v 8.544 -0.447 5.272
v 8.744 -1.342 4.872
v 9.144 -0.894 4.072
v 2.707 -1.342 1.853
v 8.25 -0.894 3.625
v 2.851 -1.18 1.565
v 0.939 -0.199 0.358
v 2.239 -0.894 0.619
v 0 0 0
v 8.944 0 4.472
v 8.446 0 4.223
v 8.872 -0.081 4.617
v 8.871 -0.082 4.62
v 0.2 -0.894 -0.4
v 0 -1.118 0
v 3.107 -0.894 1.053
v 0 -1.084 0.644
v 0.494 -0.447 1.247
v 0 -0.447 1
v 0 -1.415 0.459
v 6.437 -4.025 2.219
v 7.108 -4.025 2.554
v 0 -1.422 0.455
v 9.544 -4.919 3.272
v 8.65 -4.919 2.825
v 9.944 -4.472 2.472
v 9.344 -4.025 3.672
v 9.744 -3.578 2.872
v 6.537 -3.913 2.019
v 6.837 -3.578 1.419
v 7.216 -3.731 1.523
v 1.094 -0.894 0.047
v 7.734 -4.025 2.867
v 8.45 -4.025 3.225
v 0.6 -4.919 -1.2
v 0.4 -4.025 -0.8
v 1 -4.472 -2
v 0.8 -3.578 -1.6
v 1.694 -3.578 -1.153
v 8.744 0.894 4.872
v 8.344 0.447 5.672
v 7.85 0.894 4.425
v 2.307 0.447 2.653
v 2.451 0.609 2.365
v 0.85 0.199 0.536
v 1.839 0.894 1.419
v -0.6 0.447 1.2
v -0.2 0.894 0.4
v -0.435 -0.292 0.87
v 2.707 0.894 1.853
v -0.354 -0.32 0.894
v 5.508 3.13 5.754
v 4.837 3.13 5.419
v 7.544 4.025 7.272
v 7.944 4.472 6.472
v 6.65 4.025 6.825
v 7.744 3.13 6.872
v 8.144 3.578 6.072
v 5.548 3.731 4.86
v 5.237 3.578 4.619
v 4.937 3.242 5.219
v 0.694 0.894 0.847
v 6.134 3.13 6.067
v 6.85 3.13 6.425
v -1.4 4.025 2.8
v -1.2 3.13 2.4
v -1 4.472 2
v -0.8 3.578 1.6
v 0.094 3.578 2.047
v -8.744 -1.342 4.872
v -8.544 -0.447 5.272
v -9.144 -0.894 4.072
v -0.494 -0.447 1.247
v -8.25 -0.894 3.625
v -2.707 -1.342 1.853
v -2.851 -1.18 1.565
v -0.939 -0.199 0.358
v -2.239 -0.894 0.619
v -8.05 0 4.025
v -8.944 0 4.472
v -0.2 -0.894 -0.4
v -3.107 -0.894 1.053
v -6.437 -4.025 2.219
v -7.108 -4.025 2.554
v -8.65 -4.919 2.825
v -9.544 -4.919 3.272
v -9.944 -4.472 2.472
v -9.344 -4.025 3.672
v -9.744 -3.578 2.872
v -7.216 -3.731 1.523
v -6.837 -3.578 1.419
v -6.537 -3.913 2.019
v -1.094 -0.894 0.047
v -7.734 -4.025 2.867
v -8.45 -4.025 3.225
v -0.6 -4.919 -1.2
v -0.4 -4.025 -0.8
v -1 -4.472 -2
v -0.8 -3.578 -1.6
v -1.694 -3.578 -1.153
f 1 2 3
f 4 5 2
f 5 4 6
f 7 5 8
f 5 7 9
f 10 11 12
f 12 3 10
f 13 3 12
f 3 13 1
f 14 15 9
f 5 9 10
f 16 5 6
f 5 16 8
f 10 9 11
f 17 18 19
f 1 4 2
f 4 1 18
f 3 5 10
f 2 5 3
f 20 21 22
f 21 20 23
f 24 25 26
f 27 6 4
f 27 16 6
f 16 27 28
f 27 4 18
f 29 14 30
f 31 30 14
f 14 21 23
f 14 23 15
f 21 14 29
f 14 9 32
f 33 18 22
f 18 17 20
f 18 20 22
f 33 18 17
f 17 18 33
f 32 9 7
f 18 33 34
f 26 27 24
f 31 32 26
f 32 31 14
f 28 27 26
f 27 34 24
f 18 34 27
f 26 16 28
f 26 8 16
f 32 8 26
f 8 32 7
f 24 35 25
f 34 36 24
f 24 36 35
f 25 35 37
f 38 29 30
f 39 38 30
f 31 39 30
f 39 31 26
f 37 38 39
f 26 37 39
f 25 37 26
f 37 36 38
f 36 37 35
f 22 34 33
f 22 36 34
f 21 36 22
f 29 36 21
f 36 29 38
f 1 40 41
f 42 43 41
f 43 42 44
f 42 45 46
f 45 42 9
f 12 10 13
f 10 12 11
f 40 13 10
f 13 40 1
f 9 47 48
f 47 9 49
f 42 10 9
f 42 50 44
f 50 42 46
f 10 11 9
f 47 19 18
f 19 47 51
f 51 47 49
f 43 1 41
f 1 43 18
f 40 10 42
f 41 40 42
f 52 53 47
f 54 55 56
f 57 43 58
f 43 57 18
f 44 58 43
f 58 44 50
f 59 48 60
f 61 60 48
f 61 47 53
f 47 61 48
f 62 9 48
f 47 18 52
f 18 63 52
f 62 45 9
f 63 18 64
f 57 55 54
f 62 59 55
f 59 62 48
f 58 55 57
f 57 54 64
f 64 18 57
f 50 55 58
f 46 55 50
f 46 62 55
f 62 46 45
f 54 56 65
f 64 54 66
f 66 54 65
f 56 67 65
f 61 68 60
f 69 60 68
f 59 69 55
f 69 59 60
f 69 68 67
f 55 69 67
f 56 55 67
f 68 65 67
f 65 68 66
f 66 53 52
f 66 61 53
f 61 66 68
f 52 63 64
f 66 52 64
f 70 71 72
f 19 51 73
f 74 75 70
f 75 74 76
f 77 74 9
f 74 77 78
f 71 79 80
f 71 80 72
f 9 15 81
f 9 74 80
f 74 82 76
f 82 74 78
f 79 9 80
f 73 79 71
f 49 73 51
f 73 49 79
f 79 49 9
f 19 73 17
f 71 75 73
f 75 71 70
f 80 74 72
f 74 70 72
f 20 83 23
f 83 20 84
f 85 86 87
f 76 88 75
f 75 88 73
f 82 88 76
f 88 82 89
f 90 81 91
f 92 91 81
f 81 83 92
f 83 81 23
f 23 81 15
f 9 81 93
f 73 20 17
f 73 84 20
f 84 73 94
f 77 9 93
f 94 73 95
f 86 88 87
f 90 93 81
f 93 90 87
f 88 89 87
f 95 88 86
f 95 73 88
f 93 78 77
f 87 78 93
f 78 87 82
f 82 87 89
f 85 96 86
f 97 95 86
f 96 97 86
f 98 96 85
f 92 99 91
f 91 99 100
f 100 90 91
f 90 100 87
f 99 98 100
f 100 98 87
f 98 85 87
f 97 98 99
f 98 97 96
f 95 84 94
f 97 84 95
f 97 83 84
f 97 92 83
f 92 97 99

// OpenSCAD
$fn=5;
union()
{
	union()
	{
		hull()
		{
			translate([8.049845,0,4.0249224])
			{
				rotate(90,[0.4472136,0,-0.8944272])
				{
					cube([1,1,1]);
				}
			}
			translate([0,0,0])
			{
				rotate(90,[0.4472136,0,-0.8944272])
				{
					cube([1,1,1]);
				}
			}
		}
		hull()
		{
			translate([0,0,0])
			{
				rotate(90,[0.4472136,0,-0.8944272])
				{
					cube([1,1,1]);
				}
			}
			translate([8.849845,-3.5777092,2.4249225])
			{
				rotate(90,[0.4472136,0,-0.8944272])
				{
					cube([1,1,1]);
				}
			}
		}
		hull()
		{
			translate([8.849845,-3.5777092,2.4249225])
			{
				rotate(90,[0.4472136,0,-0.8944272])
				{
					cube([1,1,1]);
				}
			}
			translate([0.79999995,-3.5777087,-1.6])
			{
				rotate(90,[0.4472136,0,-0.8944272])
				{
					cube([1,1,1]);
				}
			}
		}
	}
	mirror([0.19999999,-0.8944272,-0.4])
	{
		union()
		{
			hull()
			{
				translate([8.049845,0,4.0249224])
				{
					rotate(90,[0.4472136,0,-0.8944272])
					{
						cube([1,1,1]);
					}
				}
				translate([0,0,0])
				{
					rotate(90,[0.4472136,0,-0.8944272])
					{
						cube([1,1,1]);
					}
				}
			}
			hull()
			{
				translate([0,0,0])
				{
					rotate(90,[0.4472136,0,-0.8944272])
					{
						cube([1,1,1]);
					}
				}
				translate([8.849845,-3.5777092,2.4249225])
				{
					rotate(90,[0.4472136,0,-0.8944272])
					{
						cube([1,1,1]);
					}
				}
			}
			hull()
			{
				translate([8.849845,-3.5777092,2.4249225])
				{
					rotate(90,[0.4472136,0,-0.8944272])
					{
						cube([1,1,1]);
					}
				}
				translate([0.79999995,-3.5777087,-1.6])
				{
					rotate(90,[0.4472136,0,-0.8944272])
					{
						cube([1,1,1]);
					}
				}
			}
		}
	}
	mirror([1,0,0])
	{
		union()
		{
			hull()
			{
				translate([8.049845,0,4.0249224])
				{
					rotate(90,[0.4472136,0,-0.8944272])
					{
						cube([1,1,1]);
					}
				}
				translate([0,0,0])
				{
					rotate(90,[0.4472136,0,-0.8944272])
					{
						cube([1,1,1]);
					}
				}
			}
			hull()
			{
				translate([0,0,0])
				{
					rotate(90,[0.4472136,0,-0.8944272])
					{
						cube([1,1,1]);
					}
				}
				translate([8.849845,-3.5777092,2.4249225])
				{
					rotate(90,[0.4472136,0,-0.8944272])
					{
						cube([1,1,1]);
					}
				}
			}
			hull()
			{
				translate([8.849845,-3.5777092,2.4249225])
				{
					rotate(90,[0.4472136,0,-0.8944272])
					{
						cube([1,1,1]);
					}
				}
				translate([0.79999995,-3.5777087,-1.6])
				{
					rotate(90,[0.4472136,0,-0.8944272])
					{
						cube([1,1,1]);
					}
				}
			}
		}
	}
}
